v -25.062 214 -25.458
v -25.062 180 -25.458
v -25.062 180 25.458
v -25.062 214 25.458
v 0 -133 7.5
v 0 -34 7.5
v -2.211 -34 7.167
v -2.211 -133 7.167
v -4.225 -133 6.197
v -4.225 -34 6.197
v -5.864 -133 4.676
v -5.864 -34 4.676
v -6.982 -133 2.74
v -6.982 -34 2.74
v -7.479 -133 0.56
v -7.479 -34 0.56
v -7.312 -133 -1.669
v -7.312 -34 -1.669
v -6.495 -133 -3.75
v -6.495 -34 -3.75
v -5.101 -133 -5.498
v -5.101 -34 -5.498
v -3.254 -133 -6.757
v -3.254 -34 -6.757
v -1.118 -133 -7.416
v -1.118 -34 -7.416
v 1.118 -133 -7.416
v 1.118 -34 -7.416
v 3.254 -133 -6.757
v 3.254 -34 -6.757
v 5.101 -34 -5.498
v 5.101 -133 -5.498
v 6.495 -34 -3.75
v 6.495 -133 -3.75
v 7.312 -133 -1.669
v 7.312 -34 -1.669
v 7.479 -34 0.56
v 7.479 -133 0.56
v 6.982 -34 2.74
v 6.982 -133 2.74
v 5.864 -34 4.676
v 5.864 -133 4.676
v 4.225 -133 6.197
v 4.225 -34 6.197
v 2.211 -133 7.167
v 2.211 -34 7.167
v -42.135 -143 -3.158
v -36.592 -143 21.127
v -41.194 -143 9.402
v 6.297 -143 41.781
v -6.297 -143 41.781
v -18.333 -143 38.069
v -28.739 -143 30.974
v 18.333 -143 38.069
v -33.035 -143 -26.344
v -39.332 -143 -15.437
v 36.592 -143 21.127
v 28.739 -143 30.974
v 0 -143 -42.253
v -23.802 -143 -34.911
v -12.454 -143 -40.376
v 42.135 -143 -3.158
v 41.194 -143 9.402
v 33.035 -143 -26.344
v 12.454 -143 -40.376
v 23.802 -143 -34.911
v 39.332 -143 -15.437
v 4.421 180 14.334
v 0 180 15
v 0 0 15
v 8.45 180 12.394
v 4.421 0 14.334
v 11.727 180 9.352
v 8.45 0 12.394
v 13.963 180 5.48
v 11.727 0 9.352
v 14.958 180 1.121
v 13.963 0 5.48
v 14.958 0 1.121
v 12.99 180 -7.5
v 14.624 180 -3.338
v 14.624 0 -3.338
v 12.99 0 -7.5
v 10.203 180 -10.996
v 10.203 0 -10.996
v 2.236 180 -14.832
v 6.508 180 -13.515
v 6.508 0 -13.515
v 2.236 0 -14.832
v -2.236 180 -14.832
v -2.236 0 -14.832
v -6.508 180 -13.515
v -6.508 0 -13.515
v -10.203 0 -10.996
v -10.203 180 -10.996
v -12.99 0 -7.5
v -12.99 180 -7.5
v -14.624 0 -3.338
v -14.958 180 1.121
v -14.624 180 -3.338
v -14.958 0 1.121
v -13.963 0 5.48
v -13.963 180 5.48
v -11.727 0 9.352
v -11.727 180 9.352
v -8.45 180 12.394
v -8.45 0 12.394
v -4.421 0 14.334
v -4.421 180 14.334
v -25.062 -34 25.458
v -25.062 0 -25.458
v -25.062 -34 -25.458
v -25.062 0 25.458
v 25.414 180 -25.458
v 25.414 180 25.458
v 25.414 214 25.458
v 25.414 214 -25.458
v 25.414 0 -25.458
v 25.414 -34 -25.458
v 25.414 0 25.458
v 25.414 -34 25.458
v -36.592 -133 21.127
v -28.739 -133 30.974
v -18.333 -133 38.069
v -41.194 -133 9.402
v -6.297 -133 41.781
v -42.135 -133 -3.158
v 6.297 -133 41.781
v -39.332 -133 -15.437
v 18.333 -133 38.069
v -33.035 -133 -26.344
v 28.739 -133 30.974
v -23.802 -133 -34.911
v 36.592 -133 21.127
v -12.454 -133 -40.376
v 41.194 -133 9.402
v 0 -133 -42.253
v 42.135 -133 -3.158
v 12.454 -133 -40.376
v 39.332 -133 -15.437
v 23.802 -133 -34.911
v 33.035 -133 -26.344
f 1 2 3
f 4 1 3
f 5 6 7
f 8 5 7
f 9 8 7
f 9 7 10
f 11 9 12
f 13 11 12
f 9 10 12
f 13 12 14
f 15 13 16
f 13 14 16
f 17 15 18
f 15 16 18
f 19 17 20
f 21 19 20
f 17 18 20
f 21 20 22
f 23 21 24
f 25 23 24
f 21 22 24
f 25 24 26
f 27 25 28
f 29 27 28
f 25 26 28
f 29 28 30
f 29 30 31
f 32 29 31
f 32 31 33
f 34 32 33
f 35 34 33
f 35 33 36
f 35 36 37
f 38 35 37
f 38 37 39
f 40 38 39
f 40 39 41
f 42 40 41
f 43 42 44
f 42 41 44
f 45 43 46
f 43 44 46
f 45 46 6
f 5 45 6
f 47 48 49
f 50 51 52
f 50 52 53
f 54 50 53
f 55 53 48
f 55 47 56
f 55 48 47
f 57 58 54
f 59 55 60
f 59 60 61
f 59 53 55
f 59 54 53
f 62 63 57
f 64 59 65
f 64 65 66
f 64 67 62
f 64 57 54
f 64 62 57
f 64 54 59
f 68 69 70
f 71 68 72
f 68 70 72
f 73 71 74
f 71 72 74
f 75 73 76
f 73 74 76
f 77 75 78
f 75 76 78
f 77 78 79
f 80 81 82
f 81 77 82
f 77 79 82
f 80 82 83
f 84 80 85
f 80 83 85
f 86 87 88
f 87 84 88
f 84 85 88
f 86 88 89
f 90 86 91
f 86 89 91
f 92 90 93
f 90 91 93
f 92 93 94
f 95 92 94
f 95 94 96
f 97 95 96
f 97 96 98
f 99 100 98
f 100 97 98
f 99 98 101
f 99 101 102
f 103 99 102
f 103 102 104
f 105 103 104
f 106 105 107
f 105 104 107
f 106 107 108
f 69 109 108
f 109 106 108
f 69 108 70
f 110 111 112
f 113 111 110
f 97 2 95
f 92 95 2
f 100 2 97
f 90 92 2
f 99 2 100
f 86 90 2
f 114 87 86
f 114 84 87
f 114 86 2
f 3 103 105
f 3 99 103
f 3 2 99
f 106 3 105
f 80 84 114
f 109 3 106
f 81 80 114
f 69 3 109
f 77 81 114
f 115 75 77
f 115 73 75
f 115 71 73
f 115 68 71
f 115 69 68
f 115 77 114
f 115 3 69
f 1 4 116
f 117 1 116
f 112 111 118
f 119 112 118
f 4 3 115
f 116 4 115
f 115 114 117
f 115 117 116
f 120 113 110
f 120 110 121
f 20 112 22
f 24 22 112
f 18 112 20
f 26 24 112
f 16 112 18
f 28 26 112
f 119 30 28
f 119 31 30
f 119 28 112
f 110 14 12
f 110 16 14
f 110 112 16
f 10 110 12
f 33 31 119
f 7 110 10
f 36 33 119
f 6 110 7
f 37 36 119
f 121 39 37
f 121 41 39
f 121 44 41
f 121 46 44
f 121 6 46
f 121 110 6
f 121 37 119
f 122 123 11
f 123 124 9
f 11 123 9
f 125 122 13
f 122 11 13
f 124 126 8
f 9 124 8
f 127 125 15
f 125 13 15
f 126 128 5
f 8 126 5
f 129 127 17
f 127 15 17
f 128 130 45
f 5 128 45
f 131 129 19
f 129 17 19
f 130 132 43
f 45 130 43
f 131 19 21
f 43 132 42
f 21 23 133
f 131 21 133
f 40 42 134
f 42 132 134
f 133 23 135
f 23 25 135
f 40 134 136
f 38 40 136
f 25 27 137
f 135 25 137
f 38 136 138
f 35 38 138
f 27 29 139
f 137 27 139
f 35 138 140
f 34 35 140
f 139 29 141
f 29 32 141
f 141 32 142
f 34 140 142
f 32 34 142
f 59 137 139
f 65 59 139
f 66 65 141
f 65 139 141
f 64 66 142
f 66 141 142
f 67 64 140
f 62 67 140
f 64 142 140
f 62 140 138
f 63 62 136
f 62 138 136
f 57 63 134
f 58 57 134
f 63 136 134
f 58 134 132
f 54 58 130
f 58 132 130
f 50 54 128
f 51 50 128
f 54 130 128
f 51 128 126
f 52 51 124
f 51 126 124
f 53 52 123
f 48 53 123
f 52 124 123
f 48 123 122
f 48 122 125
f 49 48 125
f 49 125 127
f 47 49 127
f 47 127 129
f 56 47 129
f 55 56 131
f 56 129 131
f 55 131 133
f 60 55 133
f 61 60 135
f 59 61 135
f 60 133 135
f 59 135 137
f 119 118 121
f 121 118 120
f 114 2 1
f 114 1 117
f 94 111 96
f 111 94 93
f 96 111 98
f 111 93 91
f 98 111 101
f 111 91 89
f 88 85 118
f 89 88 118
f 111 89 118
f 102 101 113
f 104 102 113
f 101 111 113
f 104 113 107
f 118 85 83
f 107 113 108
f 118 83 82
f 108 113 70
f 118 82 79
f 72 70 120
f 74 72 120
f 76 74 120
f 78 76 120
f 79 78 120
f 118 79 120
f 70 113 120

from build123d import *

# Parameters (mm, degrees)
SKETCH1_R           = 15
BOSS_EXTRUDE2_DEPTH = 194
SKETCH2_W           = 50.475671087
SKETCH2_H           = 50.915354634
BOSS_EXTRUDE3_DEPTH = 34
SKETCH3_R           = 7.5
BOSS_EXTRUDE4_DEPTH = 99
SKETCH5_R           = 42.253100096
BOSS_EXTRUDE5_DEPTH = 10


with BuildPart() as part:
    # Sketch1 → Boss-Extrude2 (new body)
    with BuildSketch(Plane(origin=(0, 0, 0), x_dir=(1, 0, 0), z_dir=(0, 1, 0))):
        with Locations(Location((0, 0, 0), (0, 0, 270))):
            Circle(SKETCH1_R)
    extrude(amount=BOSS_EXTRUDE2_DEPTH)

    # Sketch2 → Boss-Extrude3 (add)
    with BuildSketch(Plane.XZ):
        with Locations((0.175873419, 0)):
            Rectangle(SKETCH2_W, SKETCH2_H)
    boss_extrude3 = extrude(amount=BOSS_EXTRUDE3_DEPTH)

    # Mirror1: Boss-Extrude3 across plane
    add(boss_extrude3.mirror(Plane.ZX.offset(90)))

    # Sketch3 → Boss-Extrude4 (add)
    with BuildSketch(Plane.XZ.offset(34)):
        with Locations(Location((0, 0, 0), (0, 0, 90))):
            Circle(SKETCH3_R)
    extrude(amount=BOSS_EXTRUDE4_DEPTH)

    # Sketch5 → Boss-Extrude5 (add)
    with BuildSketch(Plane.XZ.offset(133)):
        with Locations(Location((0, 0, 0), (0, 0, 270))):
            Circle(SKETCH5_R)
    extrude(amount=BOSS_EXTRUDE5_DEPTH)


solid = part.part
